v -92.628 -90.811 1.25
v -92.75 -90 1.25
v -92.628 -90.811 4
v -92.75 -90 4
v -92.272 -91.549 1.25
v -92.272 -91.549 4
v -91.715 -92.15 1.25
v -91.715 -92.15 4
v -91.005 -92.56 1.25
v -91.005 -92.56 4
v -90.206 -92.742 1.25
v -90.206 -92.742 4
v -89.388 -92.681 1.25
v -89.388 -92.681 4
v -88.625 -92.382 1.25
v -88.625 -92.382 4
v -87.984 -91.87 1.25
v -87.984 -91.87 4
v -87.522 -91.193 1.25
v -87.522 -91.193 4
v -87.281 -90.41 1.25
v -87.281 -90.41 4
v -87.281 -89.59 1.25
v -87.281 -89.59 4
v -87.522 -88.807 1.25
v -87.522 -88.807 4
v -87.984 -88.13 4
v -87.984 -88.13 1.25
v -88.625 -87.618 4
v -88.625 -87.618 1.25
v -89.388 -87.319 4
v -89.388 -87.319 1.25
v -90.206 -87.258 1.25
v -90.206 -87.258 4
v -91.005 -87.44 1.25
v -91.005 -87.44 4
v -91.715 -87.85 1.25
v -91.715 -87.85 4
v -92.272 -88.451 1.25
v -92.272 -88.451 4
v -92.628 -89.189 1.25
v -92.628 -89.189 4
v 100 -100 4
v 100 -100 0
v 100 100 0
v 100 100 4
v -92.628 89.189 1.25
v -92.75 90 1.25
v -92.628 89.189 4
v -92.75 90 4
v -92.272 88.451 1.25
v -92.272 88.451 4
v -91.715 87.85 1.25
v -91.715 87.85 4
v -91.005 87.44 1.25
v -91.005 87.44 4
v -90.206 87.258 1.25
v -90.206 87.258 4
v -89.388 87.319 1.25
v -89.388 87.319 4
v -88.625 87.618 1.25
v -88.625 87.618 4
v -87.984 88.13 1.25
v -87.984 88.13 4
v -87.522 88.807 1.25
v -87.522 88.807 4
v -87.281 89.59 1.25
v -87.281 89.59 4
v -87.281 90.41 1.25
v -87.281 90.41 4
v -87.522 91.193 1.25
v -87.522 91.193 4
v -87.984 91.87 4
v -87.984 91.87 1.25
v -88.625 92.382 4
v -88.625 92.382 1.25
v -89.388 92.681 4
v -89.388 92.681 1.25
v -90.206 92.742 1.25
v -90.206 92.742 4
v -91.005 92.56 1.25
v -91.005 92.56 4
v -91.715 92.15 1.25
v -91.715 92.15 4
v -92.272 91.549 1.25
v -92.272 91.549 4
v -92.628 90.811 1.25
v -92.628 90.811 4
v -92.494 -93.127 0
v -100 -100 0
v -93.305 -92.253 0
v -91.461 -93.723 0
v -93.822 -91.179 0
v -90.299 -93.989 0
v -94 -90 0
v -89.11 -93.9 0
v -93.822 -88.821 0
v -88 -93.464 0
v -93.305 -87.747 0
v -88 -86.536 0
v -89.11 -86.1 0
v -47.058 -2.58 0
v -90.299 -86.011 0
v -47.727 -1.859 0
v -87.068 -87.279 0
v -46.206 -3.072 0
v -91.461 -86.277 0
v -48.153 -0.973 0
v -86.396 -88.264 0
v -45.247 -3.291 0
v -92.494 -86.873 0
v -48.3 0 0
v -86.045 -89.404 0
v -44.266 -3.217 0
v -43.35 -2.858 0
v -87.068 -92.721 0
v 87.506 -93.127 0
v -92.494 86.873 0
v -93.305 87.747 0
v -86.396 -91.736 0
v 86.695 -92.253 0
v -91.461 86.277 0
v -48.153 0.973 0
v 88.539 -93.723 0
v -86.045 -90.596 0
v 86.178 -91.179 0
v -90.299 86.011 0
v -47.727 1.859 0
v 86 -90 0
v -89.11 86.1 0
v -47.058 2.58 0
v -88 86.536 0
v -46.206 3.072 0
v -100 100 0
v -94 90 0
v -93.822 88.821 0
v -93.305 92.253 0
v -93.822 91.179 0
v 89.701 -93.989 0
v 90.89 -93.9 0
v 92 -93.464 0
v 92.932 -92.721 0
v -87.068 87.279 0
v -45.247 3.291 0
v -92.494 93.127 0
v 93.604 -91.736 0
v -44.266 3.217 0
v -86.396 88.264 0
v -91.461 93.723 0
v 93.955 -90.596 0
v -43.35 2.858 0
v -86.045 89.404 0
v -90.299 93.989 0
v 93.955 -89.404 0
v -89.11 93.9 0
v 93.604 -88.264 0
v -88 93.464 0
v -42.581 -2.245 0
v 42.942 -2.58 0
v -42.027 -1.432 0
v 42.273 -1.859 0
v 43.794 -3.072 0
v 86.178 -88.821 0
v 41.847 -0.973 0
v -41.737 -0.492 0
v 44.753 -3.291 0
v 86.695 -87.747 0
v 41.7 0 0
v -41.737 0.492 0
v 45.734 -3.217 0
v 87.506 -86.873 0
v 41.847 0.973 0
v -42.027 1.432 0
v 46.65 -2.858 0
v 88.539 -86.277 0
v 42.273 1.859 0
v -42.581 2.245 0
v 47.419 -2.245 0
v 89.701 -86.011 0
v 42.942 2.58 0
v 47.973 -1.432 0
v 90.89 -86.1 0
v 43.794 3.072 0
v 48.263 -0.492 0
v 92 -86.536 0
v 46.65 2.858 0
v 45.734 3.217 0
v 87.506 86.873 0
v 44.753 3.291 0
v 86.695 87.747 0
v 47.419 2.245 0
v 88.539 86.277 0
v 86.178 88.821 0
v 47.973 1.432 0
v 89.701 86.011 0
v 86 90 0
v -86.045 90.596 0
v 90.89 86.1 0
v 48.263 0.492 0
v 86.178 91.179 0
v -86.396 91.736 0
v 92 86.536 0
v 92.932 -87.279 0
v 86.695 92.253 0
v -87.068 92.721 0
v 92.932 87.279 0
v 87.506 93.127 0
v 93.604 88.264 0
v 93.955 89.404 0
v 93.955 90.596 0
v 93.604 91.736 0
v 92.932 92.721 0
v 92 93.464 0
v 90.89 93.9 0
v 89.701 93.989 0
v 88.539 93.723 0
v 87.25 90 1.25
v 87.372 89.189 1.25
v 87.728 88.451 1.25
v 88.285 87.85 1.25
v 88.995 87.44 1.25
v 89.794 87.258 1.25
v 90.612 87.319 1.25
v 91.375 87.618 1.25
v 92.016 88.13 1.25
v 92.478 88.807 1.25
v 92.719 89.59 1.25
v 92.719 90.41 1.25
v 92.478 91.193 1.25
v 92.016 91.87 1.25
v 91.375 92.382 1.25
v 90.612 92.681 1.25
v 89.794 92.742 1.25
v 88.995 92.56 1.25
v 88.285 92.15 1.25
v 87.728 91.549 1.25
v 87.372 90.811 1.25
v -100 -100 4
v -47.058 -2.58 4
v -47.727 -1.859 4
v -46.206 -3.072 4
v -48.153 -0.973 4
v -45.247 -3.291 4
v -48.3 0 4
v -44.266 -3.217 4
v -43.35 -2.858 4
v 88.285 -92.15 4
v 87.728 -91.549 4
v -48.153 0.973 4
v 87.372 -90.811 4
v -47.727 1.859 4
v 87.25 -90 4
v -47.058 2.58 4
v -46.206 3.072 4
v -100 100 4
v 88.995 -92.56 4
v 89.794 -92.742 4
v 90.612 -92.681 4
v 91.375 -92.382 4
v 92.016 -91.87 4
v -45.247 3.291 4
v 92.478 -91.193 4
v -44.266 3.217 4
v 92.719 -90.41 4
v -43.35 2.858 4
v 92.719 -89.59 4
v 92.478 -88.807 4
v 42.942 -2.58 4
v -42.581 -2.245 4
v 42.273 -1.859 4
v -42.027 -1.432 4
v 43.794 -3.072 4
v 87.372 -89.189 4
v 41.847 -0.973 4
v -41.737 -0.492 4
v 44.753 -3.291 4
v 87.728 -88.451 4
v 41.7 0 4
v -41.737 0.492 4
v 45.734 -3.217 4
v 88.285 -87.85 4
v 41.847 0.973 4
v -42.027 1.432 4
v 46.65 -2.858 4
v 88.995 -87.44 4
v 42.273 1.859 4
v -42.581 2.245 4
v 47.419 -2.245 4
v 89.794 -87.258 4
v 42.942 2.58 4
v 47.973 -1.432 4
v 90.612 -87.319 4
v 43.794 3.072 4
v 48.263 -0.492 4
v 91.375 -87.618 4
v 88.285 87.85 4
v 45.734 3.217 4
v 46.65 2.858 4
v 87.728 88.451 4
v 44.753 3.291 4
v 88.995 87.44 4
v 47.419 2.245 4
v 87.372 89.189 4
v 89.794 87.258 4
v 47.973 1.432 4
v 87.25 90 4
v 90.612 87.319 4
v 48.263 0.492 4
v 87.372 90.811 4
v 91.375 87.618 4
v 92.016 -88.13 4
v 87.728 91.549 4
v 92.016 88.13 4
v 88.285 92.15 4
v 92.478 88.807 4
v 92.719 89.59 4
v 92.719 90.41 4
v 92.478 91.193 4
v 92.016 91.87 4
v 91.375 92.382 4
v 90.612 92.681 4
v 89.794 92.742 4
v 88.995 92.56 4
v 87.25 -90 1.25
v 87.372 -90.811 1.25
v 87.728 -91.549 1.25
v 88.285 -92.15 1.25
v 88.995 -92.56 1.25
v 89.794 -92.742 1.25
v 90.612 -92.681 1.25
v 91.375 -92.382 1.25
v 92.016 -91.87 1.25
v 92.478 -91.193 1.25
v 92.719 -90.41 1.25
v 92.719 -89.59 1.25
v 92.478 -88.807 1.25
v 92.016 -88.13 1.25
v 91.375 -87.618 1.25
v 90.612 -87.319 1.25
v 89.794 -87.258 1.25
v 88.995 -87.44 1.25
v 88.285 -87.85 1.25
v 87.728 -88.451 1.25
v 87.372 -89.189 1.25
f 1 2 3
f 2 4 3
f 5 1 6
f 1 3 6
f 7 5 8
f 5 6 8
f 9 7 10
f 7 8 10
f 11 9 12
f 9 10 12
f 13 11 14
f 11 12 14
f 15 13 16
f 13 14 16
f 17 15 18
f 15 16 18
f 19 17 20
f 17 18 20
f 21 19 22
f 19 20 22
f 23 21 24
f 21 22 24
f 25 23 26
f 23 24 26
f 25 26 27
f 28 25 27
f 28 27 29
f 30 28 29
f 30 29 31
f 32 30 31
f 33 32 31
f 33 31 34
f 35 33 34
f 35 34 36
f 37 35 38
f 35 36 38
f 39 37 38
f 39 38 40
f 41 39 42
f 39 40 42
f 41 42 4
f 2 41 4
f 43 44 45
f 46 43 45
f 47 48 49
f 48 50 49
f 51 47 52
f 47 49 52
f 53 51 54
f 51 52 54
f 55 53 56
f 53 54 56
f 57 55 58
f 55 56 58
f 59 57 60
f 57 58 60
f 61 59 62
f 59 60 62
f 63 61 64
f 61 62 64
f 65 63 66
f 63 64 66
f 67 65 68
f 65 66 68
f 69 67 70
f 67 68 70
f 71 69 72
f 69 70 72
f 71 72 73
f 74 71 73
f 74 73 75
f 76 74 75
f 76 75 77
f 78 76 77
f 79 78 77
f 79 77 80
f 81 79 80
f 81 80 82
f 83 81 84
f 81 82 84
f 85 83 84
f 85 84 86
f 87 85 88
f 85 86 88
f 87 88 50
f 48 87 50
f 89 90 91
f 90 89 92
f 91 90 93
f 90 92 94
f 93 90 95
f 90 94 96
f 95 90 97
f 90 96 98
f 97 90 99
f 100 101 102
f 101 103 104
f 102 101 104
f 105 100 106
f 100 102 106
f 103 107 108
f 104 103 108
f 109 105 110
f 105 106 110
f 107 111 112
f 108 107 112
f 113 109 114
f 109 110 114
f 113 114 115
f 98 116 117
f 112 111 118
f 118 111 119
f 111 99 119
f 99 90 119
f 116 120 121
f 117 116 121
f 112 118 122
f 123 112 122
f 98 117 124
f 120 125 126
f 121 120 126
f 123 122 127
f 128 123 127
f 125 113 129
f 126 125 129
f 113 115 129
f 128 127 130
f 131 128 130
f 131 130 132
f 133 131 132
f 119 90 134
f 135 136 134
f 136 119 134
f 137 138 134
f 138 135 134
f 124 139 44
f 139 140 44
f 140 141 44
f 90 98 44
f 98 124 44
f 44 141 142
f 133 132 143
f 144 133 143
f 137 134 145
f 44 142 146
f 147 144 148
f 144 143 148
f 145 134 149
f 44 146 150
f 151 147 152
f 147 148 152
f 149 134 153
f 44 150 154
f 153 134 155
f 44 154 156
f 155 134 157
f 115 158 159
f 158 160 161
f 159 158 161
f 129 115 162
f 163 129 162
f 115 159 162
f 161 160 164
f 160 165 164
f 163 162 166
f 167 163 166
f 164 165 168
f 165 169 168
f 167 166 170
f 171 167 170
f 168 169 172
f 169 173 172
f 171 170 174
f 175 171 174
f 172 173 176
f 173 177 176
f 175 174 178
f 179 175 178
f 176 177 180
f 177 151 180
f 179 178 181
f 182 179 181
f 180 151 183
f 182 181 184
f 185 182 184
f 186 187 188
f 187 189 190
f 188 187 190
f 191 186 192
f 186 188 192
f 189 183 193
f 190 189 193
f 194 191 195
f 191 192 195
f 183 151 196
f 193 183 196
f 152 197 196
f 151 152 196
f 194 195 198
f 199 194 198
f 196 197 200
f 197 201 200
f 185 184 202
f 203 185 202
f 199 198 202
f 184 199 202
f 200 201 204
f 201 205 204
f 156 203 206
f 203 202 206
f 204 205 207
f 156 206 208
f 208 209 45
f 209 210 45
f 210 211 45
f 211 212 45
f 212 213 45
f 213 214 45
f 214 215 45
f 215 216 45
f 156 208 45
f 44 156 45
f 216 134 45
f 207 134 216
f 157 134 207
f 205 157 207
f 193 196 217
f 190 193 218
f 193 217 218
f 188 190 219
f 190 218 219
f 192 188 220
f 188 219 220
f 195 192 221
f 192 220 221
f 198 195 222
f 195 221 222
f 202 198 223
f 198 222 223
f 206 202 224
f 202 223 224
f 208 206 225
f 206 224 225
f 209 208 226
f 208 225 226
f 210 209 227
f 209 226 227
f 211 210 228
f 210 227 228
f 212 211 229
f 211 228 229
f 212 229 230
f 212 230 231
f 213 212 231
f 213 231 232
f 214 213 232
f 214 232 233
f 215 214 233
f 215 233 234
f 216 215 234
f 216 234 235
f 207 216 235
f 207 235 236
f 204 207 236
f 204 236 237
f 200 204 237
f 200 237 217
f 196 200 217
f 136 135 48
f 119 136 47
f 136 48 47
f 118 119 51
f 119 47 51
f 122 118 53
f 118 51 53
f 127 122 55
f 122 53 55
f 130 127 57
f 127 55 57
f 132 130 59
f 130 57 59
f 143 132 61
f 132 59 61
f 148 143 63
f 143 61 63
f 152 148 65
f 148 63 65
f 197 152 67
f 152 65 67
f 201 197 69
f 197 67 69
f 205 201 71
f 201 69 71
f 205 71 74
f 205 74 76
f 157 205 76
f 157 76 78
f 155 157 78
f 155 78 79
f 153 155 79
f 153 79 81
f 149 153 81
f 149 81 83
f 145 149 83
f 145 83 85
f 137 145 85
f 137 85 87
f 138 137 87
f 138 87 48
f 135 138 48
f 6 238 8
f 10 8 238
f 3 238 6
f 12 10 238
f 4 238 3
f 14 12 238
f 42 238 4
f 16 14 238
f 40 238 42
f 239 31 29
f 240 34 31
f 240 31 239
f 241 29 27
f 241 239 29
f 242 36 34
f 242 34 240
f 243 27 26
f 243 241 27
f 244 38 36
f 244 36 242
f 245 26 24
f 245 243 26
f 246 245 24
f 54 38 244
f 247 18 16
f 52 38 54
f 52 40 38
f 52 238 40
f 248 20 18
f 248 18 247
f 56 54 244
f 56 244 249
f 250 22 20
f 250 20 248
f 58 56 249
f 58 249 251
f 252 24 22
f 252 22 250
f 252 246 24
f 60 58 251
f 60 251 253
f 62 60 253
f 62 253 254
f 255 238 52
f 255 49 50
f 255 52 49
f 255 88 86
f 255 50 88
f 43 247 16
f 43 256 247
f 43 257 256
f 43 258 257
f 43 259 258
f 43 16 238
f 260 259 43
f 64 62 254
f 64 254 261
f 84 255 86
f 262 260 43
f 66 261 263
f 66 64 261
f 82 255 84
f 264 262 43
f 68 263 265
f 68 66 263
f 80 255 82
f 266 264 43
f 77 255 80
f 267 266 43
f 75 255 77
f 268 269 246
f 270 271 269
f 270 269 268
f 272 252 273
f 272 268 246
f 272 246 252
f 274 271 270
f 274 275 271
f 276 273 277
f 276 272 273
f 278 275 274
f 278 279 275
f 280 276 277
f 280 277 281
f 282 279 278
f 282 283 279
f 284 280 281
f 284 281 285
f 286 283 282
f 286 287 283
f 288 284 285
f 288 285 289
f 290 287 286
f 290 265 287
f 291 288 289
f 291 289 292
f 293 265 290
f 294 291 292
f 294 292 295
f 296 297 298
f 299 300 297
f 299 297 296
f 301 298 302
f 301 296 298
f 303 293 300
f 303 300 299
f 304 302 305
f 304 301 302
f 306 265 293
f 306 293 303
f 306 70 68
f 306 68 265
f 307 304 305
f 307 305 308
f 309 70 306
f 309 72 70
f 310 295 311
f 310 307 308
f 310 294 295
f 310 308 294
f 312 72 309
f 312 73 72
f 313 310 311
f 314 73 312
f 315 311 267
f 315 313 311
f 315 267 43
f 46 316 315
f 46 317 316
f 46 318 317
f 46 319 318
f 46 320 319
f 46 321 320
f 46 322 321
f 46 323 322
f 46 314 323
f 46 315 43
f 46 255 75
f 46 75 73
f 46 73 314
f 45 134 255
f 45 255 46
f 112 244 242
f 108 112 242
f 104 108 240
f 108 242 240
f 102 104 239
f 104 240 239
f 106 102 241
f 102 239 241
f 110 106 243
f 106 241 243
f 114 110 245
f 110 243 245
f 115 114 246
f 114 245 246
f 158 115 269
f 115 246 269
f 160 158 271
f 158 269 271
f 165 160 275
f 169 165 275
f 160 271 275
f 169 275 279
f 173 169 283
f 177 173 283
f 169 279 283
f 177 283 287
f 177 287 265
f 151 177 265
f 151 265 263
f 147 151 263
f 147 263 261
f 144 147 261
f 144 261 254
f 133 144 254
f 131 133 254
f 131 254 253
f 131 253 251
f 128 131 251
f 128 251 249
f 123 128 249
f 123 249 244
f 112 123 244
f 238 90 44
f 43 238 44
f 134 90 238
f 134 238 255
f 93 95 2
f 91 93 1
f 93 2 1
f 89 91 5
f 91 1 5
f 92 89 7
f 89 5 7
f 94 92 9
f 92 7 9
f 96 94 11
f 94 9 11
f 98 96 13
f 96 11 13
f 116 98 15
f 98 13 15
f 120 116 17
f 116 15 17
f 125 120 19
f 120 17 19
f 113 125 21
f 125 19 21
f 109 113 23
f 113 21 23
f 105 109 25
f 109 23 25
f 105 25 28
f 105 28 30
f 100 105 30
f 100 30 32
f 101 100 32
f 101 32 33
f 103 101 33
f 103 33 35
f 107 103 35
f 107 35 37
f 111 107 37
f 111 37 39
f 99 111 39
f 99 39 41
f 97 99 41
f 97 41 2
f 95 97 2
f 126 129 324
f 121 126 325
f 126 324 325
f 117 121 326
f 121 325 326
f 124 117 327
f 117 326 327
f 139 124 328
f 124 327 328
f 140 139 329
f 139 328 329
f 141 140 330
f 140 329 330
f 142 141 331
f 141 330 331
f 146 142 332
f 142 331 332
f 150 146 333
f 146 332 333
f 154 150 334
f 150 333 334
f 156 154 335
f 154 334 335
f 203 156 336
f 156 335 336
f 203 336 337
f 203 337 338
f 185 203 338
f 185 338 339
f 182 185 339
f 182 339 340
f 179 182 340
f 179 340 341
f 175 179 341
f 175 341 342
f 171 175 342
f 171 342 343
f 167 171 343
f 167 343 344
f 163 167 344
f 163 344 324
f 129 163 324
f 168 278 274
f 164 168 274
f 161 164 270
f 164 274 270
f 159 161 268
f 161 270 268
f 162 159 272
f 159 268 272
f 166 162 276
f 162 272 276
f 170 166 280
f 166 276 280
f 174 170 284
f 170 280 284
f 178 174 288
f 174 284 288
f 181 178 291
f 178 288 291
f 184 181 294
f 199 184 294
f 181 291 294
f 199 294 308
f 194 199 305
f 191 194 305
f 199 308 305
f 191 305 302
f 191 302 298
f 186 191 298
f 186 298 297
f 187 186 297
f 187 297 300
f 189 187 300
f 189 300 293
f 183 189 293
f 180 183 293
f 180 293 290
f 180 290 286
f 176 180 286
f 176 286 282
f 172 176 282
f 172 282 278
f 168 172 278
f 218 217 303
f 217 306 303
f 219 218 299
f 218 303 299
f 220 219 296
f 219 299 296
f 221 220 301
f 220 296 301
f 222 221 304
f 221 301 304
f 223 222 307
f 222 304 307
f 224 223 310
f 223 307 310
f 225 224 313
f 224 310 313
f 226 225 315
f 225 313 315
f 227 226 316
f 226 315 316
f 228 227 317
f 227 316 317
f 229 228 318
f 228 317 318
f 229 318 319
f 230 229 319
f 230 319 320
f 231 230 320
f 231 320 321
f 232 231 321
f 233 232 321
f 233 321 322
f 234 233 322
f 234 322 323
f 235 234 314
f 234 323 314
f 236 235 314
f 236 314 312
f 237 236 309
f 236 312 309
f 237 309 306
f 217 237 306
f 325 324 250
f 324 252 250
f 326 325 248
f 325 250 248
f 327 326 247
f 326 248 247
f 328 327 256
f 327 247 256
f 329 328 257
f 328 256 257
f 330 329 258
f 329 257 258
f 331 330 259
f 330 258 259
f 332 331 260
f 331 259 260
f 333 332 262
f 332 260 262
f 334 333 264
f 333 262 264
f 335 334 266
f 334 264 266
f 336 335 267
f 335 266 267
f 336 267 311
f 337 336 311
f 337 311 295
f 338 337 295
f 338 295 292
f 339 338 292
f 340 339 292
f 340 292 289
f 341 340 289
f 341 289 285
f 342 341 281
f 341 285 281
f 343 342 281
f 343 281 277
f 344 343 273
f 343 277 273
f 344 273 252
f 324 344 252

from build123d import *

# Parameters (mm, degrees)
F0_W           = 200
F0_H           = 200
F1_DEPTH       = 4
F2_D           = 5.5
F2_CSINK_D     = 8
F2_CSINK_ANGLE = 90
F3_D           = 6.6


with BuildPart() as f1:
    # F0 (on Top) → F1 (new body)
    with BuildSketch(Plane.XY):
        Rectangle(F0_W, F0_H)
    extrude(amount=F1_DEPTH)

    # F2 (through all)
    with Locations(Plane(origin=(0, 0, 0), x_dir=(1, 0, 0), z_dir=(0, 0, -1))):
        with Locations((-90, 90), (90, 90), (90, -90), (-90, -90)):
            CounterSinkHole(F2_D / 2, F2_CSINK_D / 2, counter_sink_angle=F2_CSINK_ANGLE)

    # F3 (through all)
    with Locations(Plane(origin=(0, 0, 0), x_dir=(1, 0, 0), z_dir=(0, 0, -1))):
        with Locations((45, 0), (-45, 0)):
            Hole(F3_D / 2)


solid = f1.part
